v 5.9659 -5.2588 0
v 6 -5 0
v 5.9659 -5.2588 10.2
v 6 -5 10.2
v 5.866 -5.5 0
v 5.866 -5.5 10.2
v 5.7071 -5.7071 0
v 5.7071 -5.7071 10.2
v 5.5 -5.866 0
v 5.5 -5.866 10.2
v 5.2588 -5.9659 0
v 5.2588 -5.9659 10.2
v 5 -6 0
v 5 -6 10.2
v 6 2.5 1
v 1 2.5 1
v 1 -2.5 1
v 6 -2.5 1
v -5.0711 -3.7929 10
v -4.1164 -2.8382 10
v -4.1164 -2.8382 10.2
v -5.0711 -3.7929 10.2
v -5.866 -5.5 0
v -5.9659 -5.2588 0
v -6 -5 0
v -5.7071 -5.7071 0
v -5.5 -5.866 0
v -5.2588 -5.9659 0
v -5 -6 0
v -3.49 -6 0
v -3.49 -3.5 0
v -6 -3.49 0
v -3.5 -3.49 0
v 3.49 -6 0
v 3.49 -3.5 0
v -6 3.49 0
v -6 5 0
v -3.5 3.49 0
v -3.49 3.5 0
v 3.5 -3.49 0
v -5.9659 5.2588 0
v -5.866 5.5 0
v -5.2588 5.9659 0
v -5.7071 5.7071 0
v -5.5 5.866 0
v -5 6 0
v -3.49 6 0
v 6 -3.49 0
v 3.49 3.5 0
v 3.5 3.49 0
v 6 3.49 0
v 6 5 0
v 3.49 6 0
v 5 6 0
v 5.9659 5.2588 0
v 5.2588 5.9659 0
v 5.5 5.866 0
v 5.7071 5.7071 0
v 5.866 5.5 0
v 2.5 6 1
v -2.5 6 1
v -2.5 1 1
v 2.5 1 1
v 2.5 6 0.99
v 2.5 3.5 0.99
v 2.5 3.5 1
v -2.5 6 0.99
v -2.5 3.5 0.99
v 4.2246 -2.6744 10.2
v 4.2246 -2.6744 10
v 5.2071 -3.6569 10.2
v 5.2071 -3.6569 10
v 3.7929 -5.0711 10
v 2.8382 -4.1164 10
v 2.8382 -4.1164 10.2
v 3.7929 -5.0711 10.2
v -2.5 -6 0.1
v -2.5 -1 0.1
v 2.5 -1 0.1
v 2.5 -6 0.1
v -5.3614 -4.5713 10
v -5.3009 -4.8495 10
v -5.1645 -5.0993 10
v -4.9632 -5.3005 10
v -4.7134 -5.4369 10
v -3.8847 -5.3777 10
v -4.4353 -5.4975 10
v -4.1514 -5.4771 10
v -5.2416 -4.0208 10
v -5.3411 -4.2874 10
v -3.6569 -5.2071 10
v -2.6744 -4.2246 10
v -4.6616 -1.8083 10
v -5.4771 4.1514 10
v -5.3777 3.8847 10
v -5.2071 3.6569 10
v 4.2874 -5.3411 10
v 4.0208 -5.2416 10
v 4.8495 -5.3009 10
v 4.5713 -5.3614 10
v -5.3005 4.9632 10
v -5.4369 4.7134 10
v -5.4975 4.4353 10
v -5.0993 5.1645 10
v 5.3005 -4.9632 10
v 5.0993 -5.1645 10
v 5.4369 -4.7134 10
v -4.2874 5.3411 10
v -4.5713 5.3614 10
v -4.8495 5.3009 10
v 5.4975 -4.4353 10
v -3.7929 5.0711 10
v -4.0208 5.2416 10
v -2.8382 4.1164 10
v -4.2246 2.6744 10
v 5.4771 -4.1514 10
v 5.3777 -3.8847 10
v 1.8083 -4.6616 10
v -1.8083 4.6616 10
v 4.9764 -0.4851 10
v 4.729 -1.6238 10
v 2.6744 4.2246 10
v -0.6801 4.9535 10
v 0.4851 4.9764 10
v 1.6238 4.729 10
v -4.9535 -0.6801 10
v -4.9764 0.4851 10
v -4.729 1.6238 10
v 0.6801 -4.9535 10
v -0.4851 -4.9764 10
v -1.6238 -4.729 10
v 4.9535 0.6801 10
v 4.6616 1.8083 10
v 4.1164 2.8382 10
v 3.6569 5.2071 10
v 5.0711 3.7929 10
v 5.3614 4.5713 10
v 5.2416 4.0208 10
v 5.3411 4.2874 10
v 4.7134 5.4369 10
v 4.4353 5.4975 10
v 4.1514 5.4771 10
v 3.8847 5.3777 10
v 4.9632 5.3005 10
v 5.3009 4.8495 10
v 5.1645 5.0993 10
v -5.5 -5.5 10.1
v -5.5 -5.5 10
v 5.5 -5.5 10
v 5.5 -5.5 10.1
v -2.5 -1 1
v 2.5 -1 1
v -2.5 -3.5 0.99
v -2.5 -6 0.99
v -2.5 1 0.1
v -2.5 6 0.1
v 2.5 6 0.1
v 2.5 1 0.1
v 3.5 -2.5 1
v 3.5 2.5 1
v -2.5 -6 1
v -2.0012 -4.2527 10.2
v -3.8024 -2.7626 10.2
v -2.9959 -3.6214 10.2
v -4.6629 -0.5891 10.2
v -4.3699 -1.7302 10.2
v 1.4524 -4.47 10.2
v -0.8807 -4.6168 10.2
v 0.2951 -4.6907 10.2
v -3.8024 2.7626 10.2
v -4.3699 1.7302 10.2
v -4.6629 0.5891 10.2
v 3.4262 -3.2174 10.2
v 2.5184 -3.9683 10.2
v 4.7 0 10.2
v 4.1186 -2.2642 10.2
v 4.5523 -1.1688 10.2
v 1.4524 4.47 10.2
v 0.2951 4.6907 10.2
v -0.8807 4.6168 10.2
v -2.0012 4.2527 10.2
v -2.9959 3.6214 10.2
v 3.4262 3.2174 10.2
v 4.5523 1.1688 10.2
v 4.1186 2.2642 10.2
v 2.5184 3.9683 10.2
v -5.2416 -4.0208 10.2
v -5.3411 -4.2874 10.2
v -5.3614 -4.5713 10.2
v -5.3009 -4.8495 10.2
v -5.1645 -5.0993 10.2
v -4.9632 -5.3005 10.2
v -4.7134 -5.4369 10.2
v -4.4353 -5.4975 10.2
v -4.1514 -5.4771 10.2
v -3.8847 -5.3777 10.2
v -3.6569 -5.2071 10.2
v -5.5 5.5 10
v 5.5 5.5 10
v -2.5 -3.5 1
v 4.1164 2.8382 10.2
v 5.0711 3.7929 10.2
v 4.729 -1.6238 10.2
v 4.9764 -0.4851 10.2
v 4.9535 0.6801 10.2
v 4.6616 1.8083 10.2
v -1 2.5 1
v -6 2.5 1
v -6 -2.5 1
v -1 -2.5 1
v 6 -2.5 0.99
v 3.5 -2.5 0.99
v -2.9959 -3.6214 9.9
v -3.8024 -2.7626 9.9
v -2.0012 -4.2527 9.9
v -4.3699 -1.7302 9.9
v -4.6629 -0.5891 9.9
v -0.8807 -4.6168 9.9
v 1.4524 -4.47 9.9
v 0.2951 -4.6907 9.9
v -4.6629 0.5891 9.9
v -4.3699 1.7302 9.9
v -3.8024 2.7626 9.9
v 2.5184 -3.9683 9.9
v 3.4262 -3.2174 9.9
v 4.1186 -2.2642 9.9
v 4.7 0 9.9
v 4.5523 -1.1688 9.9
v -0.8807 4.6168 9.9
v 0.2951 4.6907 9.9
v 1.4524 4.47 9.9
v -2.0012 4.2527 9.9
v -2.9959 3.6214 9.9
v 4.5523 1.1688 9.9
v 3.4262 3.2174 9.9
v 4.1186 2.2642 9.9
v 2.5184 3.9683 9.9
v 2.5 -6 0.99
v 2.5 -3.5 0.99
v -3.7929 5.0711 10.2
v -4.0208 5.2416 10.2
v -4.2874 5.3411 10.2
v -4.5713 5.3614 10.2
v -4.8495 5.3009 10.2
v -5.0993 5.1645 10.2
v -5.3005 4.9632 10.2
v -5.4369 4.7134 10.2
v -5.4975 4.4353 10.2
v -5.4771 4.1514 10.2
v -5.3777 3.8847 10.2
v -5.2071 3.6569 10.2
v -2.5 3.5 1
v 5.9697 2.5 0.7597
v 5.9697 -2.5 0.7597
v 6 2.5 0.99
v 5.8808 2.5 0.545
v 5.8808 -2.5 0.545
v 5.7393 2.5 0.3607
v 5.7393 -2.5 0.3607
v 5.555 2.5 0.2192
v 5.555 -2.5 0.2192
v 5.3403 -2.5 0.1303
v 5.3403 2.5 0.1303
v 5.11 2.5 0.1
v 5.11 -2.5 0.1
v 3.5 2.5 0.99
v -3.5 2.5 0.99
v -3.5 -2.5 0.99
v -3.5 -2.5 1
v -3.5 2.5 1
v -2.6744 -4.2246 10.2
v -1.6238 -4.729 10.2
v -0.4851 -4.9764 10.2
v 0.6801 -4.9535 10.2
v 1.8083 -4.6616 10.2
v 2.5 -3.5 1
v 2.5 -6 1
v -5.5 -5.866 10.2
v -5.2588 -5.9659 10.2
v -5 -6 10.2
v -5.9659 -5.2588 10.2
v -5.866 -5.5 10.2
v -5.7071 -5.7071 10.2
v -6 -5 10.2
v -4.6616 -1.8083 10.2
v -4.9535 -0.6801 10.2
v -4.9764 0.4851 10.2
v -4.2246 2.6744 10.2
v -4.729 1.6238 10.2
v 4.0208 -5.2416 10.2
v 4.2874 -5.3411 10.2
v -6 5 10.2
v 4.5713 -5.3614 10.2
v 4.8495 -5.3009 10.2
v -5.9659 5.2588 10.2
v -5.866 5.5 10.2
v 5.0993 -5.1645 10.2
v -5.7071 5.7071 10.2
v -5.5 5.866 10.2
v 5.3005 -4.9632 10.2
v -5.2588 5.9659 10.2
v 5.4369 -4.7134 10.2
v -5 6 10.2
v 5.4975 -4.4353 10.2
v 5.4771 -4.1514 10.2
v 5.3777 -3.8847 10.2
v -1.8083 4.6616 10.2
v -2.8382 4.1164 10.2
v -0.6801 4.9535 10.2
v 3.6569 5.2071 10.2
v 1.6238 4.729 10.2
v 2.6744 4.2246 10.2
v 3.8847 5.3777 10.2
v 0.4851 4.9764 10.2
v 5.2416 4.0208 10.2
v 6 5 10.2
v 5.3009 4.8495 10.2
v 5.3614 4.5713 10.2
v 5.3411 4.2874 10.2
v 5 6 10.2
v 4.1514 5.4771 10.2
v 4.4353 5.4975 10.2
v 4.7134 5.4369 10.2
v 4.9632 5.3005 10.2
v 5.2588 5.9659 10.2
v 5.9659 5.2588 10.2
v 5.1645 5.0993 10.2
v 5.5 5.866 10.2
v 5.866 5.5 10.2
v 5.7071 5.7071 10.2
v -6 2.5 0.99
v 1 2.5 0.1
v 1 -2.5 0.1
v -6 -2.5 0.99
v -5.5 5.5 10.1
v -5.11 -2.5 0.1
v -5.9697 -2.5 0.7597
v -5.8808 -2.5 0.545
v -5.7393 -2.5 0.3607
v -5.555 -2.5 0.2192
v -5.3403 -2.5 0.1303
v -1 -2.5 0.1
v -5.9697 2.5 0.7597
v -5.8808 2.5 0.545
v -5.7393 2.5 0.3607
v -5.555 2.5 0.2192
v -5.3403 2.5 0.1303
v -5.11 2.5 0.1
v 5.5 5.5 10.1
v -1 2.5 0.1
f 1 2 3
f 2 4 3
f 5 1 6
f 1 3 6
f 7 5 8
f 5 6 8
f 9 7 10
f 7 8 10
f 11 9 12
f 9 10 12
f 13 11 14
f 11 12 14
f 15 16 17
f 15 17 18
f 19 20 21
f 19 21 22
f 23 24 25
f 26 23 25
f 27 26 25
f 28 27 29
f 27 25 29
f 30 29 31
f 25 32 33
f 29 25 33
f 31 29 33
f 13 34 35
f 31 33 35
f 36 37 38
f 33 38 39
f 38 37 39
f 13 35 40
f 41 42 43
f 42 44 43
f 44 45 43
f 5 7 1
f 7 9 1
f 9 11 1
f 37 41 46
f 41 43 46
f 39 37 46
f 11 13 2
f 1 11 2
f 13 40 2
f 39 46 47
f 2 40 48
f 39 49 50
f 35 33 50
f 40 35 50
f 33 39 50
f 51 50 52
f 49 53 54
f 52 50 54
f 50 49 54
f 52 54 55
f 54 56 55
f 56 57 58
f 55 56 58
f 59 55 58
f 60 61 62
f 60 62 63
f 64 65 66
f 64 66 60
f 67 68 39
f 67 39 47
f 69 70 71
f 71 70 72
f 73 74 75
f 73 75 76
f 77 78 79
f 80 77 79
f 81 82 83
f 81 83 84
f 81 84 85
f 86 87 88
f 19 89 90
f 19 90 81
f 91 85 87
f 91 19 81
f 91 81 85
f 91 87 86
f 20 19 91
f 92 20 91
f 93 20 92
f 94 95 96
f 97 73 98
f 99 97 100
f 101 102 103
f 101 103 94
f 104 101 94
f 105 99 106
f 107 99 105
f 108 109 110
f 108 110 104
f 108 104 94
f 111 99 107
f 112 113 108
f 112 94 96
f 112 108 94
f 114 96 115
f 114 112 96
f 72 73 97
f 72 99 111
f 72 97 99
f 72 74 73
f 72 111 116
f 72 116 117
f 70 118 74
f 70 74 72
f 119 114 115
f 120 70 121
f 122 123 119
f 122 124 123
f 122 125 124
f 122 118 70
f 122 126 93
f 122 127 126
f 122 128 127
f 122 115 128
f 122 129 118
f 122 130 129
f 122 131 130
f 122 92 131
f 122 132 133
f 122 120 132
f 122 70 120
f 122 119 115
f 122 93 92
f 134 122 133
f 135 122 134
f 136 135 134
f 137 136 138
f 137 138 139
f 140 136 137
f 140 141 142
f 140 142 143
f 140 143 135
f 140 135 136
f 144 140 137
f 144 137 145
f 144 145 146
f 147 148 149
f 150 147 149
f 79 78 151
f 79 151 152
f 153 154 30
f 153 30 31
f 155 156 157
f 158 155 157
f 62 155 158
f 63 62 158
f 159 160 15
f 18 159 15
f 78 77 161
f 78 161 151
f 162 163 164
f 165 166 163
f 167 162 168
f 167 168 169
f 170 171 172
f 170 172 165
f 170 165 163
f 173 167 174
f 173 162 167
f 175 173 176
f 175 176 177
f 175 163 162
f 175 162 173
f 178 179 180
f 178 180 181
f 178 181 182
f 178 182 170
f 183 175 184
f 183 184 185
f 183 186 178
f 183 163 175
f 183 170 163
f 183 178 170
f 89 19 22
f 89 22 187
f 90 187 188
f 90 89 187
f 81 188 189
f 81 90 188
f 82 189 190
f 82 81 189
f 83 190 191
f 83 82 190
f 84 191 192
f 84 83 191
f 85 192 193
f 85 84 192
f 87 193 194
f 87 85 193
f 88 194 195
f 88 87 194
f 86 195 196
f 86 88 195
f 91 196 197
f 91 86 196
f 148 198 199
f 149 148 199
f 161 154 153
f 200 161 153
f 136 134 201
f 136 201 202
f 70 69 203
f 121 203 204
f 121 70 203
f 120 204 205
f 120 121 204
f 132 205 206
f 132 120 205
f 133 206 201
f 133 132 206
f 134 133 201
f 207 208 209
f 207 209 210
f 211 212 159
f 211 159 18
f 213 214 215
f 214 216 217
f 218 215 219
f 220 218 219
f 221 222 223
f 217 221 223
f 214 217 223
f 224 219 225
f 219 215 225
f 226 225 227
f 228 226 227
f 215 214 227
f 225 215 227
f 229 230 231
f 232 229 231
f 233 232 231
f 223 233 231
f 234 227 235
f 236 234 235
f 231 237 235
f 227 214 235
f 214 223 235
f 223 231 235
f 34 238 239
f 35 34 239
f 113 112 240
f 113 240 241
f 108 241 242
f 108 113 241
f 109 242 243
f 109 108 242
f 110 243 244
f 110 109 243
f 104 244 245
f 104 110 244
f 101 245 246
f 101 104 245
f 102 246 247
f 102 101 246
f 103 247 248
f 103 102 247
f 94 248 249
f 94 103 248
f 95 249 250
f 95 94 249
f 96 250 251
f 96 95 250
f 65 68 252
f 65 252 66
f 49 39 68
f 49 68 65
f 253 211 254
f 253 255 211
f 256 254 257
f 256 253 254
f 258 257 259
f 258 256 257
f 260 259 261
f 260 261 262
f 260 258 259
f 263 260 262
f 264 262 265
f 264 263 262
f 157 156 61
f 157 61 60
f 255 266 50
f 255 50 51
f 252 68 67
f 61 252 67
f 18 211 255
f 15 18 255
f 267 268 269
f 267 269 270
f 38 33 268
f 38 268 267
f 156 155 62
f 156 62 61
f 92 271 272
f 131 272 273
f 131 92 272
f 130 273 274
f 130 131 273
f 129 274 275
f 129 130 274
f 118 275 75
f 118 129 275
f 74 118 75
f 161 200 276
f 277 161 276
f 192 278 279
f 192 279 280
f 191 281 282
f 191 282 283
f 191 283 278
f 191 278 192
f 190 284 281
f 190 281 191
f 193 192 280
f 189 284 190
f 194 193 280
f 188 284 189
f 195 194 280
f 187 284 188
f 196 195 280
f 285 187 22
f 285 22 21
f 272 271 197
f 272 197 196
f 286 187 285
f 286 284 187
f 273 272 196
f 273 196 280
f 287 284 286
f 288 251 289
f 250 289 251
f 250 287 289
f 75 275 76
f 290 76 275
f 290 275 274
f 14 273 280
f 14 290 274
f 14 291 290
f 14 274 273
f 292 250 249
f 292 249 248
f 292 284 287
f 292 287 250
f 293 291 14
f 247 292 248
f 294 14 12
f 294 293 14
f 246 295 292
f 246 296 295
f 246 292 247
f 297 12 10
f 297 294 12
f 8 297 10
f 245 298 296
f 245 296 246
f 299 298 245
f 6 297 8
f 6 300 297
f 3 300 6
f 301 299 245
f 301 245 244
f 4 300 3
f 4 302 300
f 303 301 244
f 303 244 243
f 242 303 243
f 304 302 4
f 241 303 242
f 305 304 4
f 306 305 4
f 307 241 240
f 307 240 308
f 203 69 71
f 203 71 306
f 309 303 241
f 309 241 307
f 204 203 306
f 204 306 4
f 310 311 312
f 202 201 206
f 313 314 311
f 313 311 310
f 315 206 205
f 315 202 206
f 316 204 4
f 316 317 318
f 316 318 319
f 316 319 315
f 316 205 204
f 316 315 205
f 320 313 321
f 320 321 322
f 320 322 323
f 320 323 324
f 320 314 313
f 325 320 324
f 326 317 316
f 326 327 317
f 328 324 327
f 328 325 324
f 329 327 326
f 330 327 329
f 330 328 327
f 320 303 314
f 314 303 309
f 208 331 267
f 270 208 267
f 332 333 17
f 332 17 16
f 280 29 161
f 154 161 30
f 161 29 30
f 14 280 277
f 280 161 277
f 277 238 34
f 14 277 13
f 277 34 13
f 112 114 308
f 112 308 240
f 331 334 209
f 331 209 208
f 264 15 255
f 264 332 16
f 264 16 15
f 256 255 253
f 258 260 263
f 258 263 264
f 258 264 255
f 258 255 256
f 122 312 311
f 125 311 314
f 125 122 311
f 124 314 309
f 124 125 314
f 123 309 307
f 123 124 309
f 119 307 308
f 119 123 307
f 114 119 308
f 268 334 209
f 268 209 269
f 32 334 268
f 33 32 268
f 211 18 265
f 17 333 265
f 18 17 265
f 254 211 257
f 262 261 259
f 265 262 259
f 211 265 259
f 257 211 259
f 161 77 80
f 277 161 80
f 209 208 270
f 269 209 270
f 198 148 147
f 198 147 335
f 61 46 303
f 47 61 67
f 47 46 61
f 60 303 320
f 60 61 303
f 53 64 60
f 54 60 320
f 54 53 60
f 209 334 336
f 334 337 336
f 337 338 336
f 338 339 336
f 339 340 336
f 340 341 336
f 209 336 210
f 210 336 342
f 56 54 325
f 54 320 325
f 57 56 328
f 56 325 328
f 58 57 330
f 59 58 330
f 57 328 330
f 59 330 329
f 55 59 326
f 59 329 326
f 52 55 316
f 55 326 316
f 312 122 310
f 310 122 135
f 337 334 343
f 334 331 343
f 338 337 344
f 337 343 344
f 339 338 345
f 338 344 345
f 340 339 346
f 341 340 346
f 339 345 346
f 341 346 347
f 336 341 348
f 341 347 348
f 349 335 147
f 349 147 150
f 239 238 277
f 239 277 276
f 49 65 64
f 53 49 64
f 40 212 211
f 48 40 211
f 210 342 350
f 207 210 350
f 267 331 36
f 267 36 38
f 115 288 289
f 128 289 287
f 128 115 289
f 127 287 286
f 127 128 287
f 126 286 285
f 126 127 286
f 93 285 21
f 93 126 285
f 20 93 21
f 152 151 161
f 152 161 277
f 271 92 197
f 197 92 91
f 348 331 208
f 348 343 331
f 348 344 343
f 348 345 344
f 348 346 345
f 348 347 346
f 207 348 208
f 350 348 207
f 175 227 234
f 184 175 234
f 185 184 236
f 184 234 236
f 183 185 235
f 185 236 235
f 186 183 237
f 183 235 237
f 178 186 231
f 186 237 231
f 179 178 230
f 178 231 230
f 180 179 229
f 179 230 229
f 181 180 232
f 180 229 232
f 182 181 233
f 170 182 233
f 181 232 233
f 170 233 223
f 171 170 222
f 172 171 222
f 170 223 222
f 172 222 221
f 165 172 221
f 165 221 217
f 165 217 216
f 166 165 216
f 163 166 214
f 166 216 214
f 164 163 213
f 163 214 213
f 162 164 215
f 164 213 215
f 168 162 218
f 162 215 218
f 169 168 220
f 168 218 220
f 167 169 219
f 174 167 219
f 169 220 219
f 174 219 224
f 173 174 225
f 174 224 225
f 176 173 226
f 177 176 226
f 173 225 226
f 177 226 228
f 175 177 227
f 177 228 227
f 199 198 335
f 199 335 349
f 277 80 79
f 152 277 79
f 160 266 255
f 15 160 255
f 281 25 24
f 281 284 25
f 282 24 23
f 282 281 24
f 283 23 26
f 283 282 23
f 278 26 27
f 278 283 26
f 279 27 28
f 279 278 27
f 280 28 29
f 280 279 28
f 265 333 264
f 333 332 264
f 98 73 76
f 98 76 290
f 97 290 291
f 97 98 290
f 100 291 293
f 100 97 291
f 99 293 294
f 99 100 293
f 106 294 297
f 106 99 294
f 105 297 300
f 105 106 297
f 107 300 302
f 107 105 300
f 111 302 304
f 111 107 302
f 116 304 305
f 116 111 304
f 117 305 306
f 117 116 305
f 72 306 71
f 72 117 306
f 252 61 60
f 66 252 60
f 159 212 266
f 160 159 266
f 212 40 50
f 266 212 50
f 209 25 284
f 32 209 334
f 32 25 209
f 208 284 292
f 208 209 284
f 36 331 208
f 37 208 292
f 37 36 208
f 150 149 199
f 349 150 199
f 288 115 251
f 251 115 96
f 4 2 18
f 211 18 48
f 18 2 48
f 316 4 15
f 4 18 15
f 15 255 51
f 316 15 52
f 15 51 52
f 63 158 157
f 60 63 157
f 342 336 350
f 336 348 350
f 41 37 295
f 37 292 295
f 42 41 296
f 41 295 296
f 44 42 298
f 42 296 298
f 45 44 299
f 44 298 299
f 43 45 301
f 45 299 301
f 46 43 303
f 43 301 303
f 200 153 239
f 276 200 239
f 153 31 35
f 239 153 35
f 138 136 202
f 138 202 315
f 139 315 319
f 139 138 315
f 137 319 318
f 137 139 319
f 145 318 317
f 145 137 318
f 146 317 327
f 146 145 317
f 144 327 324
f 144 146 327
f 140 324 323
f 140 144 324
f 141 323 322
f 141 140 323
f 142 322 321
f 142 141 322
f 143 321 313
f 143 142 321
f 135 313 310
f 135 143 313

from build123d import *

# Parameters (mm, degrees)
BOX006_W                  = 5
BOX006_H                  = 5
BOX006_DEPTH              = 0.9
BOX007_W                  = 5
BOX007_H                  = 5
BOX007_DEPTH              = 0.9
BOX005_W                  = 5
BOX005_H                  = 5
BOX005_DEPTH              = 0.9
FILLET_R                  = 0.89
BOX004_W                  = 5
BOX004_H                  = 5
BOX004_DEPTH              = 0.9
FILLET003_R               = 0.89
CYLINDER002_R             = 4.7
CYLINDER002_DEPTH         = 0.3
BOX012_W                  = 11
BOX012_H                  = 11
BOX012_DEPTH              = 0.1
BOX009_W                  = 2
BOX009_H                  = 1.5
BOX009_DEPTH              = 0.3
CYLINDER007_R             = 1
CYLINDER007_DEPTH         = 0.3
FUSION001_PLACEMENT_ANGLE = 225
BOX008_W                  = 2
BOX008_H                  = 1.5
BOX008_DEPTH              = 0.3
CYLINDER006_R             = 1
CYLINDER006_DEPTH         = 0.3
FUSION_PLACEMENT_ANGLE    = -45
BOX011_W                  = 2
BOX011_H                  = 1.5
BOX011_DEPTH              = 0.3
CYLINDER009_R             = 1
CYLINDER009_DEPTH         = 0.3
FUSION003_PLACEMENT_ANGLE = 135
BOX010_W                  = 2
BOX010_H                  = 1.5
BOX010_DEPTH              = 0.3
CYLINDER008_R             = 1
CYLINDER008_DEPTH         = 0.3
FUSION002_PLACEMENT_ANGLE = 45
CYLINDER001_R             = 5
CYLINDER001_DEPTH         = 0.3
BOX001_W                  = 5
BOX001_H                  = 3.5
BOX001_DEPTH              = 1
BOX_W                     = 5
BOX_H                     = 3.5
BOX_DEPTH                 = 1
BOX002_W                  = 3.5
BOX002_H                  = 5
BOX002_DEPTH              = 1
BOX003_W                  = 3.5
BOX003_H                  = 5
BOX003_DEPTH              = 1
SKETCH_W                  = 12
SKETCH_H                  = 12
PAD_DEPTH                 = 10.2
CHAMFER_SIZE              = 0.99
FILLET002_R               = 1


with BuildPart() as kub006:
    # Box006 → Box006 (new body)
    with BuildSketch(Plane(origin=(-2.5, 1, 0.1), x_dir=(1, 0, 0), z_dir=(0, 0, 1))):
        with Locations((2.5, 2.5)):
            Rectangle(BOX006_W, BOX006_H)
    extrude(amount=BOX006_DEPTH)


with BuildPart() as kub007:
    # Box007 → Box007 (new body)
    with BuildSketch(Plane(origin=(-2.5, -6, 0.1), x_dir=(1, 0, 0), z_dir=(0, 0, 1))):
        with Locations((2.5, 2.5)):
            Rectangle(BOX007_W, BOX007_H)
    extrude(amount=BOX007_DEPTH)


with BuildPart() as fillet_body:
    # Box005 → Box005 (new body)
    with BuildSketch(Plane(origin=(-6, -2.5, 0.1), x_dir=(1, 0, 0), z_dir=(0, 0, 1))):
        with Locations((2.5, 2.5)):
            Rectangle(BOX005_W, BOX005_H)
    extrude(amount=BOX005_DEPTH)

    # Fillet
    fillet_edges = [fillet_body.edges().sort_by_distance(p)[0] for p in [
        (-6, 0, 0.1),
    ]]
    fillet(fillet_edges, radius=FILLET_R)


with BuildPart() as fillet003:
    # Box004 → Box004 (new body)
    with BuildSketch(Plane(origin=(1, -2.5, 0.1), x_dir=(1, 0, 0), z_dir=(0, 0, 1))):
        with Locations((2.5, 2.5)):
            Rectangle(BOX004_W, BOX004_H)
    extrude(amount=BOX004_DEPTH)

    # Fillet003
    fillet003_edges = [fillet003.edges().sort_by_distance(p)[0] for p in [
        (6, 0, 0.1),
    ]]
    fillet(fillet003_edges, radius=FILLET003_R)


with BuildPart() as cylinder002:
    # Cylinder002 → Cylinder002 (new body)
    with BuildSketch(Plane.XY.offset(9.9)):
        Circle(CYLINDER002_R)
    extrude(amount=CYLINDER002_DEPTH)


with BuildPart() as kub012:
    # Box012 → Box012 (new body)
    with BuildSketch(Plane(origin=(-5.5, -5.5, 10), x_dir=(1, 0, 0), z_dir=(0, 0, 1))):
        with Locations((5.5, 5.5)):
            Rectangle(BOX012_W, BOX012_H)
    extrude(amount=BOX012_DEPTH)


with BuildPart() as kub009:
    # Box009 → Box009 (new body)
    with BuildSketch(Plane(origin=(3.5, 3, 10), x_dir=(1, 0, 0), z_dir=(0, 0, 1))):
        with Locations((1, 0.75)):
            Rectangle(BOX009_W, BOX009_H)
    extrude(amount=BOX009_DEPTH)


with BuildPart() as fusion001:
    # Cylinder007 → Cylinder007 (new body)
    with BuildSketch(Plane(origin=(4.5, 4.5, 10), x_dir=(1, 0, 0), z_dir=(0, 0, 1))):
        Circle(CYLINDER007_R)
    extrude(amount=CYLINDER007_DEPTH)

    # Fusion001: union Kub009
    add(kub009.part)


with BuildPart() as fusion001_1:
    # Fusion001 placement: moved
    add(fusion001.part.moved(Location((4.5, 2, 0))).rotate(Axis((4.5, 2, 0), (0, 0, 1)), FUSION001_PLACEMENT_ANGLE))


with BuildPart() as kub008:
    # Box008 → Box008 (new body)
    with BuildSketch(Plane(origin=(3.5, 3, 10), x_dir=(1, 0, 0), z_dir=(0, 0, 1))):
        with Locations((1, 0.75)):
            Rectangle(BOX008_W, BOX008_H)
    extrude(amount=BOX008_DEPTH)


with BuildPart() as fusion:
    # Cylinder006 → Cylinder006 (new body)
    with BuildSketch(Plane(origin=(4.5, 4.5, 10), x_dir=(1, 0, 0), z_dir=(0, 0, 1))):
        Circle(CYLINDER006_R)
    extrude(amount=CYLINDER006_DEPTH)

    # Fusion: union Kub008
    add(kub008.part)


with BuildPart() as fusion_1:
    # Fusion placement: moved
    add(fusion.part.moved(Location((-2, 4.5, 0))).rotate(Axis((-2, 4.5, 0), (0, 0, 1)), FUSION_PLACEMENT_ANGLE))


with BuildPart() as kub011:
    # Box011 → Box011 (new body)
    with BuildSketch(Plane(origin=(3.5, 3, 10), x_dir=(1, 0, 0), z_dir=(0, 0, 1))):
        with Locations((1, 0.75)):
            Rectangle(BOX011_W, BOX011_H)
    extrude(amount=BOX011_DEPTH)


with BuildPart() as fusion003:
    # Cylinder009 → Cylinder009 (new body)
    with BuildSketch(Plane(origin=(4.5, 4.5, 10), x_dir=(1, 0, 0), z_dir=(0, 0, 1))):
        Circle(CYLINDER009_R)
    extrude(amount=CYLINDER009_DEPTH)

    # Fusion003: union Kub011
    add(kub011.part)


with BuildPart() as fusion003_1:
    # Fusion003 placement: moved
    add(fusion003.part.moved(Location((2, -4.5, 0))).rotate(Axis((2, -4.5, 0), (0, 0, 1)), FUSION003_PLACEMENT_ANGLE))


with BuildPart() as kub010:
    # Box010 → Box010 (new body)
    with BuildSketch(Plane(origin=(3.5, 3, 10), x_dir=(1, 0, 0), z_dir=(0, 0, 1))):
        with Locations((1, 0.75)):
            Rectangle(BOX010_W, BOX010_H)
    extrude(amount=BOX010_DEPTH)


with BuildPart() as fusion002:
    # Cylinder008 → Cylinder008 (new body)
    with BuildSketch(Plane(origin=(4.5, 4.5, 10), x_dir=(1, 0, 0), z_dir=(0, 0, 1))):
        Circle(CYLINDER008_R)
    extrude(amount=CYLINDER008_DEPTH)

    # Fusion002: union Kub010
    add(kub010.part)


with BuildPart() as fusion002_1:
    # Fusion002 placement: moved
    add(fusion002.part.moved(Location((-4.5, -2, 0))).rotate(Axis((-4.5, -2, 0), (0, 0, 1)), FUSION002_PLACEMENT_ANGLE))


with BuildPart() as cylinder001:
    # Cylinder001 → Cylinder001 (new body)
    with BuildSketch(Plane.XY.offset(10)):
        Circle(CYLINDER001_R)
    extrude(amount=CYLINDER001_DEPTH)


with BuildPart() as kub001:
    # Box001 → Box001 (new body)
    with BuildSketch(Plane(origin=(-2.5, -7, 0), x_dir=(1, 0, 0), z_dir=(0, 0, 1))):
        with Locations((2.5, 1.75)):
            Rectangle(BOX001_W, BOX001_H)
    extrude(amount=BOX001_DEPTH)


with BuildPart() as kub:
    # Box → Box (new body)
    with BuildSketch(Plane(origin=(-2.5, 3.5, 0), x_dir=(1, 0, 0), z_dir=(0, 0, 1))):
        with Locations((2.5, 1.75)):
            Rectangle(BOX_W, BOX_H)
    extrude(amount=BOX_DEPTH)


with BuildPart() as kub002:
    # Box002 → Box002 (new body)
    with BuildSketch(Plane(origin=(-7, -2.5, 0), x_dir=(1, 0, 0), z_dir=(0, 0, 1))):
        with Locations((1.75, 2.5)):
            Rectangle(BOX002_W, BOX002_H)
    extrude(amount=BOX002_DEPTH)


with BuildPart() as kub003:
    # Box003 → Box003 (new body)
    with BuildSketch(Plane(origin=(3.5, -2.5, 0), x_dir=(1, 0, 0), z_dir=(0, 0, 1))):
        with Locations((1.75, 2.5)):
            Rectangle(BOX003_W, BOX003_H)
    extrude(amount=BOX003_DEPTH)


with BuildPart() as cut008:
    # Sketch → Pad (new body)
    with BuildSketch(Plane.XY):
        Rectangle(SKETCH_W, SKETCH_H)
    extrude(amount=PAD_DEPTH)

    # Cut: cut Kub003
    add(kub003.part, mode=Mode.SUBTRACT)

    # Cut001: cut Kub002
    add(kub002.part, mode=Mode.SUBTRACT)

    # Cut002: cut Kub
    add(kub.part, mode=Mode.SUBTRACT)

    # Cut003: cut Kub001
    add(kub001.part, mode=Mode.SUBTRACT)

    # Chamfer
    chamfer_edges = [cut008.edges().sort_by_distance(p)[0] for p in [
        (4.75, -2.5, 0),
        (4.75, 2.5, 0),
        (2.5, 4.75, 0),
        (-2.5, 4.75, 0),
        (-4.75, 2.5, 0),
        (-4.75, -2.5, 0),
        (-2.5, -4.75, 0),
        (2.5, -4.75, 0),
    ]]
    chamfer(chamfer_edges, length=CHAMFER_SIZE)

    # Fillet002
    fillet002_edges = [cut008.edges().sort_by_distance(p)[0] for p in [
        (-6, 6, 5.1),
        (6, 6, 5.1),
        (-6, -6, 5.1),
        (6, -6, 5.1),
    ]]
    fillet(fillet002_edges, radius=FILLET002_R)

    # Cut004: cut Cylinder001
    add(cylinder001.part, mode=Mode.SUBTRACT)

    # Cut005: cut Fusion002
    add(fusion002_1.part, mode=Mode.SUBTRACT)

    # Cut006: cut Fusion003
    add(fusion003_1.part, mode=Mode.SUBTRACT)

    # Cut007: cut Fusion
    add(fusion_1.part, mode=Mode.SUBTRACT)

    # Cut008: cut Fusion001
    add(fusion001_1.part, mode=Mode.SUBTRACT)


solid = Compound([kub006.part, kub007.part, fillet_body.part, fillet003.part, cylinder002.part, kub012.part, cut008.part])
